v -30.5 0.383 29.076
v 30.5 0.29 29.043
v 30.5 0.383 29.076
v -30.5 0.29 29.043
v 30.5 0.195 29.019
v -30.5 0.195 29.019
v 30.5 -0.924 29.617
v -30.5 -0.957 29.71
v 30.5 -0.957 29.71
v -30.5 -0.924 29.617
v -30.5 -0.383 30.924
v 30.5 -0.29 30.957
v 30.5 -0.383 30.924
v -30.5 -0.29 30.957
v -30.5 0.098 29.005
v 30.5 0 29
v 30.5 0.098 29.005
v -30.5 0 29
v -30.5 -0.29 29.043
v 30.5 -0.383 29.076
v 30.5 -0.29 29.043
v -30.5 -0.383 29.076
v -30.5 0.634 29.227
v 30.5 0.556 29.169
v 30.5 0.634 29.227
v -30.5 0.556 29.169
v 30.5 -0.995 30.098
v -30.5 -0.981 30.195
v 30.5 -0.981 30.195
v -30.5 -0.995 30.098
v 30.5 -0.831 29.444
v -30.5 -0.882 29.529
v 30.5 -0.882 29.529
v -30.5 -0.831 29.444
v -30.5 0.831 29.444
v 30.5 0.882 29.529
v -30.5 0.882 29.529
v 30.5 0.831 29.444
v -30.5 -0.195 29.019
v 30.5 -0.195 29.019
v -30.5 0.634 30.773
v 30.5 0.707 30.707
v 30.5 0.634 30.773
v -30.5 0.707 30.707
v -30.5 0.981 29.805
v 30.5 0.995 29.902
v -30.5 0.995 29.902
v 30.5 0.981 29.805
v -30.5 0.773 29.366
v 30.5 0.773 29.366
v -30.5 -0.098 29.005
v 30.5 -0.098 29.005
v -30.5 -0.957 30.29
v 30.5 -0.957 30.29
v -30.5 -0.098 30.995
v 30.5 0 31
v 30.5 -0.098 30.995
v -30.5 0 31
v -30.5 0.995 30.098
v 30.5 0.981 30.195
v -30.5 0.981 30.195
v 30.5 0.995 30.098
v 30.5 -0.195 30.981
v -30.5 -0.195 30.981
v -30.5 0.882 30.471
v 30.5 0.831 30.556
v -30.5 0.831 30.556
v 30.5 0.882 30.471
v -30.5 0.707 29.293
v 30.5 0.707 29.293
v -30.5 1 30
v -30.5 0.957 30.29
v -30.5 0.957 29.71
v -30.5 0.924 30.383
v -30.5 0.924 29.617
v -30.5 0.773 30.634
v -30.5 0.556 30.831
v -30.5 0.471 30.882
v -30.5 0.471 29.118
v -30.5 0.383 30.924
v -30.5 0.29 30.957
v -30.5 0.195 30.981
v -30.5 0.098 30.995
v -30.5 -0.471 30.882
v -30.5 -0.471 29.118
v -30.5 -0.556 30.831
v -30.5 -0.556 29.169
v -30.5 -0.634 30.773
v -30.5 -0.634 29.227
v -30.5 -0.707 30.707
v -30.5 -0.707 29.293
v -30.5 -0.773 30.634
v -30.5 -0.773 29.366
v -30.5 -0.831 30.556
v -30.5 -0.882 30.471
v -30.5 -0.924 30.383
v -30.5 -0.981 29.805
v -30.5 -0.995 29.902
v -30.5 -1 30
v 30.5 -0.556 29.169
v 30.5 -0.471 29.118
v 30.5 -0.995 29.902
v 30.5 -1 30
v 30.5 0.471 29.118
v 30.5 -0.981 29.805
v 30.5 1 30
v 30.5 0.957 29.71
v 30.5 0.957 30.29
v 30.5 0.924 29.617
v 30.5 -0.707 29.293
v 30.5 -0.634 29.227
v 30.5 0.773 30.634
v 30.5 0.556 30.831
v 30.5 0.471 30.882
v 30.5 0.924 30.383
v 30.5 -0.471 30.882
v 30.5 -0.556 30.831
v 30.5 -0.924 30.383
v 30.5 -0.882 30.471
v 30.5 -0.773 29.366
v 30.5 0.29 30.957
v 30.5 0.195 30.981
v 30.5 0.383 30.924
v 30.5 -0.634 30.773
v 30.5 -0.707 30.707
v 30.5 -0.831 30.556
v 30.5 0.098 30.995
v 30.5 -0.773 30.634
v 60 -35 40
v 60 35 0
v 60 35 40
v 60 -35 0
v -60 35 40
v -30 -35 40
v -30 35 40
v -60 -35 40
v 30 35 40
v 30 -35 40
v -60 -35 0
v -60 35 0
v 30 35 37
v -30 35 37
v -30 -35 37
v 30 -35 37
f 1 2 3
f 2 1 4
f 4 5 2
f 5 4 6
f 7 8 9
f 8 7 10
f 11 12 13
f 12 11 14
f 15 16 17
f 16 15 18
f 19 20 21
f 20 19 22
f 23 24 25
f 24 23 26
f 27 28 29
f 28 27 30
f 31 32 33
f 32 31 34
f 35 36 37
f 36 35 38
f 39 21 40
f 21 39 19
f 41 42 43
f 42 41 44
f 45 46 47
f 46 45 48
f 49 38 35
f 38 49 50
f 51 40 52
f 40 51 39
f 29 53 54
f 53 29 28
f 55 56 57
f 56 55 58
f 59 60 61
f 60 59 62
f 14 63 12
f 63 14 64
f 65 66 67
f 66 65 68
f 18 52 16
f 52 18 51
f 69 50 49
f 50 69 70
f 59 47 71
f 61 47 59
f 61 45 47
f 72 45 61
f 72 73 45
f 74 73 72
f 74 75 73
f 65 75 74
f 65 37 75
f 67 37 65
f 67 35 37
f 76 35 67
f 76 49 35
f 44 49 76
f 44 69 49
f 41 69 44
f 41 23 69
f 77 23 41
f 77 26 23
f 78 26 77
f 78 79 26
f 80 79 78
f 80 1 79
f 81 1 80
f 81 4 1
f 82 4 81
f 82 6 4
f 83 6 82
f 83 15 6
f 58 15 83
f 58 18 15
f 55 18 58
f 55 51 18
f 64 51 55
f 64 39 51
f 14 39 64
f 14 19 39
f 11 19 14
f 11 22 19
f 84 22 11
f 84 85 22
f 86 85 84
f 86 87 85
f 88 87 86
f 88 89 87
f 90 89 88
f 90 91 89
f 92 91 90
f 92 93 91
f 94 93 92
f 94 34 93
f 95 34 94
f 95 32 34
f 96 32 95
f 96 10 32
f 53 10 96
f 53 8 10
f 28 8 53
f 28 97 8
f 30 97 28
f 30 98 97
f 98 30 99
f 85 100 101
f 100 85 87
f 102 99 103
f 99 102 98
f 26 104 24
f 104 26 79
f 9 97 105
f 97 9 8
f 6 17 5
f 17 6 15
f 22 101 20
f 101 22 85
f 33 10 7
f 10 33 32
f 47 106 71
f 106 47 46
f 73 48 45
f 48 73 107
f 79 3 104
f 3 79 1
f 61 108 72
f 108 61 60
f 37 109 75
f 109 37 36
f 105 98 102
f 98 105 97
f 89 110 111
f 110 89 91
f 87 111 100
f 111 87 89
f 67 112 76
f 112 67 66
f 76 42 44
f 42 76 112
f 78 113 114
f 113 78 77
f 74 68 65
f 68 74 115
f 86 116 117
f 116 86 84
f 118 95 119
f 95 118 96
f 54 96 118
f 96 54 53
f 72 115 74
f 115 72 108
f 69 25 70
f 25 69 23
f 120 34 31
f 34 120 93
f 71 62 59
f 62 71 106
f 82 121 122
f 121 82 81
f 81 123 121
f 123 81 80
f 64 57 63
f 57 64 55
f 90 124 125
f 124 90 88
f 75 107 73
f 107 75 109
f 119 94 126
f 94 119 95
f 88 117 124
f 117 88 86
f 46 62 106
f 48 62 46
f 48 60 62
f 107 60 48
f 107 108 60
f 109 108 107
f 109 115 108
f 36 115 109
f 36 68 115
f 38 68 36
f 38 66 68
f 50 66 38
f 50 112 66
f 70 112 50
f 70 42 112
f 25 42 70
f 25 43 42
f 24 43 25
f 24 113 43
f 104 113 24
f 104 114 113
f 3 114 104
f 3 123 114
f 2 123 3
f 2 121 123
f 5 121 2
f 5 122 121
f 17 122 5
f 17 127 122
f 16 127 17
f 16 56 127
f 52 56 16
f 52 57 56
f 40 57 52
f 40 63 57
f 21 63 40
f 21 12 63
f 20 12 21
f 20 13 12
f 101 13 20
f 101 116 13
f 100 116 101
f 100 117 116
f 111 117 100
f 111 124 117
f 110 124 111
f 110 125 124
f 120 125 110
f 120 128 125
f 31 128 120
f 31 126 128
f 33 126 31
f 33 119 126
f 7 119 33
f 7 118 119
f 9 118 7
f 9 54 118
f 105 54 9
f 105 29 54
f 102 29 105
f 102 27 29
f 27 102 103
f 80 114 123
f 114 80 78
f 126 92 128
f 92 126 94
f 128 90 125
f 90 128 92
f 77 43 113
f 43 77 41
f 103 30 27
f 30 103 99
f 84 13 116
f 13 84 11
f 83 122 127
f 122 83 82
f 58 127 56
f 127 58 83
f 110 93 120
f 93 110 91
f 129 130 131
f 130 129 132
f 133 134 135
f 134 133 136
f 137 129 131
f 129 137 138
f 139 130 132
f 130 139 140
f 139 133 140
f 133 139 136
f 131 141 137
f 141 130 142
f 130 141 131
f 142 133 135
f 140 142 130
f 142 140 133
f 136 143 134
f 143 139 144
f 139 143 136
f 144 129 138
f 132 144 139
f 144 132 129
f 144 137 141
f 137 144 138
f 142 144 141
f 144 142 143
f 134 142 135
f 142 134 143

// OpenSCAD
// Buffer tank for mini horizontal gel-electrophoresis box
// Print orientation: open top facing up, resting on XY plane at z = 0

// ---------- Parameters ----------
tank_x      = 120;   // outer length in X
tank_y      = 70;    // outer width in Y
tank_h      = 40;    // outer height in Z
wall        = 3;     // wall thickness
floor       = 3;     // floor thickness
platform_x  = 60;    // platform length in X (centred)
platform_y  = tank_y; // platform spans full inner width
platform_top = 10;   // platform top height above tank floor (z = 13)
hole_d      = 2;     // electrode hole diameter
y_hole      = 0;     // electrode hole Y position
z_hole      = 30;    // electrode hole Z position
eps         = 0.5;   // cutter overshoot past faces

$fn = 64;

// ---------- Derived ----------
inner_h   = tank_h - floor - wall;              // 34 mm inner height
wall_t    = tank_x - platform_x;                // end wall thickness (30 mm)

// ---------- Model ----------
difference() {
    // Main tank body
    translate([-tank_x/2, -tank_y/2, 0])
        cube([tank_x, tank_y, tank_h]);

    // Raised platform for gel tray
    translate([-platform_x/2, -platform_y/2, tank_h - floor - wall + floor])
        cube([platform_x, platform_y, platform_top]);

    // Horizontal electrode holes through each end wall
    for (sx = [-1, 1])
        translate([sx > 0 ? tank_x/2 - wall_t : -tank_x/2 + wall_t, y_hole, z_hole])
            rotate([0, 90, 0])
                cylinder(d = hole_d, h = wall_t + 2*eps, center = true);
}
